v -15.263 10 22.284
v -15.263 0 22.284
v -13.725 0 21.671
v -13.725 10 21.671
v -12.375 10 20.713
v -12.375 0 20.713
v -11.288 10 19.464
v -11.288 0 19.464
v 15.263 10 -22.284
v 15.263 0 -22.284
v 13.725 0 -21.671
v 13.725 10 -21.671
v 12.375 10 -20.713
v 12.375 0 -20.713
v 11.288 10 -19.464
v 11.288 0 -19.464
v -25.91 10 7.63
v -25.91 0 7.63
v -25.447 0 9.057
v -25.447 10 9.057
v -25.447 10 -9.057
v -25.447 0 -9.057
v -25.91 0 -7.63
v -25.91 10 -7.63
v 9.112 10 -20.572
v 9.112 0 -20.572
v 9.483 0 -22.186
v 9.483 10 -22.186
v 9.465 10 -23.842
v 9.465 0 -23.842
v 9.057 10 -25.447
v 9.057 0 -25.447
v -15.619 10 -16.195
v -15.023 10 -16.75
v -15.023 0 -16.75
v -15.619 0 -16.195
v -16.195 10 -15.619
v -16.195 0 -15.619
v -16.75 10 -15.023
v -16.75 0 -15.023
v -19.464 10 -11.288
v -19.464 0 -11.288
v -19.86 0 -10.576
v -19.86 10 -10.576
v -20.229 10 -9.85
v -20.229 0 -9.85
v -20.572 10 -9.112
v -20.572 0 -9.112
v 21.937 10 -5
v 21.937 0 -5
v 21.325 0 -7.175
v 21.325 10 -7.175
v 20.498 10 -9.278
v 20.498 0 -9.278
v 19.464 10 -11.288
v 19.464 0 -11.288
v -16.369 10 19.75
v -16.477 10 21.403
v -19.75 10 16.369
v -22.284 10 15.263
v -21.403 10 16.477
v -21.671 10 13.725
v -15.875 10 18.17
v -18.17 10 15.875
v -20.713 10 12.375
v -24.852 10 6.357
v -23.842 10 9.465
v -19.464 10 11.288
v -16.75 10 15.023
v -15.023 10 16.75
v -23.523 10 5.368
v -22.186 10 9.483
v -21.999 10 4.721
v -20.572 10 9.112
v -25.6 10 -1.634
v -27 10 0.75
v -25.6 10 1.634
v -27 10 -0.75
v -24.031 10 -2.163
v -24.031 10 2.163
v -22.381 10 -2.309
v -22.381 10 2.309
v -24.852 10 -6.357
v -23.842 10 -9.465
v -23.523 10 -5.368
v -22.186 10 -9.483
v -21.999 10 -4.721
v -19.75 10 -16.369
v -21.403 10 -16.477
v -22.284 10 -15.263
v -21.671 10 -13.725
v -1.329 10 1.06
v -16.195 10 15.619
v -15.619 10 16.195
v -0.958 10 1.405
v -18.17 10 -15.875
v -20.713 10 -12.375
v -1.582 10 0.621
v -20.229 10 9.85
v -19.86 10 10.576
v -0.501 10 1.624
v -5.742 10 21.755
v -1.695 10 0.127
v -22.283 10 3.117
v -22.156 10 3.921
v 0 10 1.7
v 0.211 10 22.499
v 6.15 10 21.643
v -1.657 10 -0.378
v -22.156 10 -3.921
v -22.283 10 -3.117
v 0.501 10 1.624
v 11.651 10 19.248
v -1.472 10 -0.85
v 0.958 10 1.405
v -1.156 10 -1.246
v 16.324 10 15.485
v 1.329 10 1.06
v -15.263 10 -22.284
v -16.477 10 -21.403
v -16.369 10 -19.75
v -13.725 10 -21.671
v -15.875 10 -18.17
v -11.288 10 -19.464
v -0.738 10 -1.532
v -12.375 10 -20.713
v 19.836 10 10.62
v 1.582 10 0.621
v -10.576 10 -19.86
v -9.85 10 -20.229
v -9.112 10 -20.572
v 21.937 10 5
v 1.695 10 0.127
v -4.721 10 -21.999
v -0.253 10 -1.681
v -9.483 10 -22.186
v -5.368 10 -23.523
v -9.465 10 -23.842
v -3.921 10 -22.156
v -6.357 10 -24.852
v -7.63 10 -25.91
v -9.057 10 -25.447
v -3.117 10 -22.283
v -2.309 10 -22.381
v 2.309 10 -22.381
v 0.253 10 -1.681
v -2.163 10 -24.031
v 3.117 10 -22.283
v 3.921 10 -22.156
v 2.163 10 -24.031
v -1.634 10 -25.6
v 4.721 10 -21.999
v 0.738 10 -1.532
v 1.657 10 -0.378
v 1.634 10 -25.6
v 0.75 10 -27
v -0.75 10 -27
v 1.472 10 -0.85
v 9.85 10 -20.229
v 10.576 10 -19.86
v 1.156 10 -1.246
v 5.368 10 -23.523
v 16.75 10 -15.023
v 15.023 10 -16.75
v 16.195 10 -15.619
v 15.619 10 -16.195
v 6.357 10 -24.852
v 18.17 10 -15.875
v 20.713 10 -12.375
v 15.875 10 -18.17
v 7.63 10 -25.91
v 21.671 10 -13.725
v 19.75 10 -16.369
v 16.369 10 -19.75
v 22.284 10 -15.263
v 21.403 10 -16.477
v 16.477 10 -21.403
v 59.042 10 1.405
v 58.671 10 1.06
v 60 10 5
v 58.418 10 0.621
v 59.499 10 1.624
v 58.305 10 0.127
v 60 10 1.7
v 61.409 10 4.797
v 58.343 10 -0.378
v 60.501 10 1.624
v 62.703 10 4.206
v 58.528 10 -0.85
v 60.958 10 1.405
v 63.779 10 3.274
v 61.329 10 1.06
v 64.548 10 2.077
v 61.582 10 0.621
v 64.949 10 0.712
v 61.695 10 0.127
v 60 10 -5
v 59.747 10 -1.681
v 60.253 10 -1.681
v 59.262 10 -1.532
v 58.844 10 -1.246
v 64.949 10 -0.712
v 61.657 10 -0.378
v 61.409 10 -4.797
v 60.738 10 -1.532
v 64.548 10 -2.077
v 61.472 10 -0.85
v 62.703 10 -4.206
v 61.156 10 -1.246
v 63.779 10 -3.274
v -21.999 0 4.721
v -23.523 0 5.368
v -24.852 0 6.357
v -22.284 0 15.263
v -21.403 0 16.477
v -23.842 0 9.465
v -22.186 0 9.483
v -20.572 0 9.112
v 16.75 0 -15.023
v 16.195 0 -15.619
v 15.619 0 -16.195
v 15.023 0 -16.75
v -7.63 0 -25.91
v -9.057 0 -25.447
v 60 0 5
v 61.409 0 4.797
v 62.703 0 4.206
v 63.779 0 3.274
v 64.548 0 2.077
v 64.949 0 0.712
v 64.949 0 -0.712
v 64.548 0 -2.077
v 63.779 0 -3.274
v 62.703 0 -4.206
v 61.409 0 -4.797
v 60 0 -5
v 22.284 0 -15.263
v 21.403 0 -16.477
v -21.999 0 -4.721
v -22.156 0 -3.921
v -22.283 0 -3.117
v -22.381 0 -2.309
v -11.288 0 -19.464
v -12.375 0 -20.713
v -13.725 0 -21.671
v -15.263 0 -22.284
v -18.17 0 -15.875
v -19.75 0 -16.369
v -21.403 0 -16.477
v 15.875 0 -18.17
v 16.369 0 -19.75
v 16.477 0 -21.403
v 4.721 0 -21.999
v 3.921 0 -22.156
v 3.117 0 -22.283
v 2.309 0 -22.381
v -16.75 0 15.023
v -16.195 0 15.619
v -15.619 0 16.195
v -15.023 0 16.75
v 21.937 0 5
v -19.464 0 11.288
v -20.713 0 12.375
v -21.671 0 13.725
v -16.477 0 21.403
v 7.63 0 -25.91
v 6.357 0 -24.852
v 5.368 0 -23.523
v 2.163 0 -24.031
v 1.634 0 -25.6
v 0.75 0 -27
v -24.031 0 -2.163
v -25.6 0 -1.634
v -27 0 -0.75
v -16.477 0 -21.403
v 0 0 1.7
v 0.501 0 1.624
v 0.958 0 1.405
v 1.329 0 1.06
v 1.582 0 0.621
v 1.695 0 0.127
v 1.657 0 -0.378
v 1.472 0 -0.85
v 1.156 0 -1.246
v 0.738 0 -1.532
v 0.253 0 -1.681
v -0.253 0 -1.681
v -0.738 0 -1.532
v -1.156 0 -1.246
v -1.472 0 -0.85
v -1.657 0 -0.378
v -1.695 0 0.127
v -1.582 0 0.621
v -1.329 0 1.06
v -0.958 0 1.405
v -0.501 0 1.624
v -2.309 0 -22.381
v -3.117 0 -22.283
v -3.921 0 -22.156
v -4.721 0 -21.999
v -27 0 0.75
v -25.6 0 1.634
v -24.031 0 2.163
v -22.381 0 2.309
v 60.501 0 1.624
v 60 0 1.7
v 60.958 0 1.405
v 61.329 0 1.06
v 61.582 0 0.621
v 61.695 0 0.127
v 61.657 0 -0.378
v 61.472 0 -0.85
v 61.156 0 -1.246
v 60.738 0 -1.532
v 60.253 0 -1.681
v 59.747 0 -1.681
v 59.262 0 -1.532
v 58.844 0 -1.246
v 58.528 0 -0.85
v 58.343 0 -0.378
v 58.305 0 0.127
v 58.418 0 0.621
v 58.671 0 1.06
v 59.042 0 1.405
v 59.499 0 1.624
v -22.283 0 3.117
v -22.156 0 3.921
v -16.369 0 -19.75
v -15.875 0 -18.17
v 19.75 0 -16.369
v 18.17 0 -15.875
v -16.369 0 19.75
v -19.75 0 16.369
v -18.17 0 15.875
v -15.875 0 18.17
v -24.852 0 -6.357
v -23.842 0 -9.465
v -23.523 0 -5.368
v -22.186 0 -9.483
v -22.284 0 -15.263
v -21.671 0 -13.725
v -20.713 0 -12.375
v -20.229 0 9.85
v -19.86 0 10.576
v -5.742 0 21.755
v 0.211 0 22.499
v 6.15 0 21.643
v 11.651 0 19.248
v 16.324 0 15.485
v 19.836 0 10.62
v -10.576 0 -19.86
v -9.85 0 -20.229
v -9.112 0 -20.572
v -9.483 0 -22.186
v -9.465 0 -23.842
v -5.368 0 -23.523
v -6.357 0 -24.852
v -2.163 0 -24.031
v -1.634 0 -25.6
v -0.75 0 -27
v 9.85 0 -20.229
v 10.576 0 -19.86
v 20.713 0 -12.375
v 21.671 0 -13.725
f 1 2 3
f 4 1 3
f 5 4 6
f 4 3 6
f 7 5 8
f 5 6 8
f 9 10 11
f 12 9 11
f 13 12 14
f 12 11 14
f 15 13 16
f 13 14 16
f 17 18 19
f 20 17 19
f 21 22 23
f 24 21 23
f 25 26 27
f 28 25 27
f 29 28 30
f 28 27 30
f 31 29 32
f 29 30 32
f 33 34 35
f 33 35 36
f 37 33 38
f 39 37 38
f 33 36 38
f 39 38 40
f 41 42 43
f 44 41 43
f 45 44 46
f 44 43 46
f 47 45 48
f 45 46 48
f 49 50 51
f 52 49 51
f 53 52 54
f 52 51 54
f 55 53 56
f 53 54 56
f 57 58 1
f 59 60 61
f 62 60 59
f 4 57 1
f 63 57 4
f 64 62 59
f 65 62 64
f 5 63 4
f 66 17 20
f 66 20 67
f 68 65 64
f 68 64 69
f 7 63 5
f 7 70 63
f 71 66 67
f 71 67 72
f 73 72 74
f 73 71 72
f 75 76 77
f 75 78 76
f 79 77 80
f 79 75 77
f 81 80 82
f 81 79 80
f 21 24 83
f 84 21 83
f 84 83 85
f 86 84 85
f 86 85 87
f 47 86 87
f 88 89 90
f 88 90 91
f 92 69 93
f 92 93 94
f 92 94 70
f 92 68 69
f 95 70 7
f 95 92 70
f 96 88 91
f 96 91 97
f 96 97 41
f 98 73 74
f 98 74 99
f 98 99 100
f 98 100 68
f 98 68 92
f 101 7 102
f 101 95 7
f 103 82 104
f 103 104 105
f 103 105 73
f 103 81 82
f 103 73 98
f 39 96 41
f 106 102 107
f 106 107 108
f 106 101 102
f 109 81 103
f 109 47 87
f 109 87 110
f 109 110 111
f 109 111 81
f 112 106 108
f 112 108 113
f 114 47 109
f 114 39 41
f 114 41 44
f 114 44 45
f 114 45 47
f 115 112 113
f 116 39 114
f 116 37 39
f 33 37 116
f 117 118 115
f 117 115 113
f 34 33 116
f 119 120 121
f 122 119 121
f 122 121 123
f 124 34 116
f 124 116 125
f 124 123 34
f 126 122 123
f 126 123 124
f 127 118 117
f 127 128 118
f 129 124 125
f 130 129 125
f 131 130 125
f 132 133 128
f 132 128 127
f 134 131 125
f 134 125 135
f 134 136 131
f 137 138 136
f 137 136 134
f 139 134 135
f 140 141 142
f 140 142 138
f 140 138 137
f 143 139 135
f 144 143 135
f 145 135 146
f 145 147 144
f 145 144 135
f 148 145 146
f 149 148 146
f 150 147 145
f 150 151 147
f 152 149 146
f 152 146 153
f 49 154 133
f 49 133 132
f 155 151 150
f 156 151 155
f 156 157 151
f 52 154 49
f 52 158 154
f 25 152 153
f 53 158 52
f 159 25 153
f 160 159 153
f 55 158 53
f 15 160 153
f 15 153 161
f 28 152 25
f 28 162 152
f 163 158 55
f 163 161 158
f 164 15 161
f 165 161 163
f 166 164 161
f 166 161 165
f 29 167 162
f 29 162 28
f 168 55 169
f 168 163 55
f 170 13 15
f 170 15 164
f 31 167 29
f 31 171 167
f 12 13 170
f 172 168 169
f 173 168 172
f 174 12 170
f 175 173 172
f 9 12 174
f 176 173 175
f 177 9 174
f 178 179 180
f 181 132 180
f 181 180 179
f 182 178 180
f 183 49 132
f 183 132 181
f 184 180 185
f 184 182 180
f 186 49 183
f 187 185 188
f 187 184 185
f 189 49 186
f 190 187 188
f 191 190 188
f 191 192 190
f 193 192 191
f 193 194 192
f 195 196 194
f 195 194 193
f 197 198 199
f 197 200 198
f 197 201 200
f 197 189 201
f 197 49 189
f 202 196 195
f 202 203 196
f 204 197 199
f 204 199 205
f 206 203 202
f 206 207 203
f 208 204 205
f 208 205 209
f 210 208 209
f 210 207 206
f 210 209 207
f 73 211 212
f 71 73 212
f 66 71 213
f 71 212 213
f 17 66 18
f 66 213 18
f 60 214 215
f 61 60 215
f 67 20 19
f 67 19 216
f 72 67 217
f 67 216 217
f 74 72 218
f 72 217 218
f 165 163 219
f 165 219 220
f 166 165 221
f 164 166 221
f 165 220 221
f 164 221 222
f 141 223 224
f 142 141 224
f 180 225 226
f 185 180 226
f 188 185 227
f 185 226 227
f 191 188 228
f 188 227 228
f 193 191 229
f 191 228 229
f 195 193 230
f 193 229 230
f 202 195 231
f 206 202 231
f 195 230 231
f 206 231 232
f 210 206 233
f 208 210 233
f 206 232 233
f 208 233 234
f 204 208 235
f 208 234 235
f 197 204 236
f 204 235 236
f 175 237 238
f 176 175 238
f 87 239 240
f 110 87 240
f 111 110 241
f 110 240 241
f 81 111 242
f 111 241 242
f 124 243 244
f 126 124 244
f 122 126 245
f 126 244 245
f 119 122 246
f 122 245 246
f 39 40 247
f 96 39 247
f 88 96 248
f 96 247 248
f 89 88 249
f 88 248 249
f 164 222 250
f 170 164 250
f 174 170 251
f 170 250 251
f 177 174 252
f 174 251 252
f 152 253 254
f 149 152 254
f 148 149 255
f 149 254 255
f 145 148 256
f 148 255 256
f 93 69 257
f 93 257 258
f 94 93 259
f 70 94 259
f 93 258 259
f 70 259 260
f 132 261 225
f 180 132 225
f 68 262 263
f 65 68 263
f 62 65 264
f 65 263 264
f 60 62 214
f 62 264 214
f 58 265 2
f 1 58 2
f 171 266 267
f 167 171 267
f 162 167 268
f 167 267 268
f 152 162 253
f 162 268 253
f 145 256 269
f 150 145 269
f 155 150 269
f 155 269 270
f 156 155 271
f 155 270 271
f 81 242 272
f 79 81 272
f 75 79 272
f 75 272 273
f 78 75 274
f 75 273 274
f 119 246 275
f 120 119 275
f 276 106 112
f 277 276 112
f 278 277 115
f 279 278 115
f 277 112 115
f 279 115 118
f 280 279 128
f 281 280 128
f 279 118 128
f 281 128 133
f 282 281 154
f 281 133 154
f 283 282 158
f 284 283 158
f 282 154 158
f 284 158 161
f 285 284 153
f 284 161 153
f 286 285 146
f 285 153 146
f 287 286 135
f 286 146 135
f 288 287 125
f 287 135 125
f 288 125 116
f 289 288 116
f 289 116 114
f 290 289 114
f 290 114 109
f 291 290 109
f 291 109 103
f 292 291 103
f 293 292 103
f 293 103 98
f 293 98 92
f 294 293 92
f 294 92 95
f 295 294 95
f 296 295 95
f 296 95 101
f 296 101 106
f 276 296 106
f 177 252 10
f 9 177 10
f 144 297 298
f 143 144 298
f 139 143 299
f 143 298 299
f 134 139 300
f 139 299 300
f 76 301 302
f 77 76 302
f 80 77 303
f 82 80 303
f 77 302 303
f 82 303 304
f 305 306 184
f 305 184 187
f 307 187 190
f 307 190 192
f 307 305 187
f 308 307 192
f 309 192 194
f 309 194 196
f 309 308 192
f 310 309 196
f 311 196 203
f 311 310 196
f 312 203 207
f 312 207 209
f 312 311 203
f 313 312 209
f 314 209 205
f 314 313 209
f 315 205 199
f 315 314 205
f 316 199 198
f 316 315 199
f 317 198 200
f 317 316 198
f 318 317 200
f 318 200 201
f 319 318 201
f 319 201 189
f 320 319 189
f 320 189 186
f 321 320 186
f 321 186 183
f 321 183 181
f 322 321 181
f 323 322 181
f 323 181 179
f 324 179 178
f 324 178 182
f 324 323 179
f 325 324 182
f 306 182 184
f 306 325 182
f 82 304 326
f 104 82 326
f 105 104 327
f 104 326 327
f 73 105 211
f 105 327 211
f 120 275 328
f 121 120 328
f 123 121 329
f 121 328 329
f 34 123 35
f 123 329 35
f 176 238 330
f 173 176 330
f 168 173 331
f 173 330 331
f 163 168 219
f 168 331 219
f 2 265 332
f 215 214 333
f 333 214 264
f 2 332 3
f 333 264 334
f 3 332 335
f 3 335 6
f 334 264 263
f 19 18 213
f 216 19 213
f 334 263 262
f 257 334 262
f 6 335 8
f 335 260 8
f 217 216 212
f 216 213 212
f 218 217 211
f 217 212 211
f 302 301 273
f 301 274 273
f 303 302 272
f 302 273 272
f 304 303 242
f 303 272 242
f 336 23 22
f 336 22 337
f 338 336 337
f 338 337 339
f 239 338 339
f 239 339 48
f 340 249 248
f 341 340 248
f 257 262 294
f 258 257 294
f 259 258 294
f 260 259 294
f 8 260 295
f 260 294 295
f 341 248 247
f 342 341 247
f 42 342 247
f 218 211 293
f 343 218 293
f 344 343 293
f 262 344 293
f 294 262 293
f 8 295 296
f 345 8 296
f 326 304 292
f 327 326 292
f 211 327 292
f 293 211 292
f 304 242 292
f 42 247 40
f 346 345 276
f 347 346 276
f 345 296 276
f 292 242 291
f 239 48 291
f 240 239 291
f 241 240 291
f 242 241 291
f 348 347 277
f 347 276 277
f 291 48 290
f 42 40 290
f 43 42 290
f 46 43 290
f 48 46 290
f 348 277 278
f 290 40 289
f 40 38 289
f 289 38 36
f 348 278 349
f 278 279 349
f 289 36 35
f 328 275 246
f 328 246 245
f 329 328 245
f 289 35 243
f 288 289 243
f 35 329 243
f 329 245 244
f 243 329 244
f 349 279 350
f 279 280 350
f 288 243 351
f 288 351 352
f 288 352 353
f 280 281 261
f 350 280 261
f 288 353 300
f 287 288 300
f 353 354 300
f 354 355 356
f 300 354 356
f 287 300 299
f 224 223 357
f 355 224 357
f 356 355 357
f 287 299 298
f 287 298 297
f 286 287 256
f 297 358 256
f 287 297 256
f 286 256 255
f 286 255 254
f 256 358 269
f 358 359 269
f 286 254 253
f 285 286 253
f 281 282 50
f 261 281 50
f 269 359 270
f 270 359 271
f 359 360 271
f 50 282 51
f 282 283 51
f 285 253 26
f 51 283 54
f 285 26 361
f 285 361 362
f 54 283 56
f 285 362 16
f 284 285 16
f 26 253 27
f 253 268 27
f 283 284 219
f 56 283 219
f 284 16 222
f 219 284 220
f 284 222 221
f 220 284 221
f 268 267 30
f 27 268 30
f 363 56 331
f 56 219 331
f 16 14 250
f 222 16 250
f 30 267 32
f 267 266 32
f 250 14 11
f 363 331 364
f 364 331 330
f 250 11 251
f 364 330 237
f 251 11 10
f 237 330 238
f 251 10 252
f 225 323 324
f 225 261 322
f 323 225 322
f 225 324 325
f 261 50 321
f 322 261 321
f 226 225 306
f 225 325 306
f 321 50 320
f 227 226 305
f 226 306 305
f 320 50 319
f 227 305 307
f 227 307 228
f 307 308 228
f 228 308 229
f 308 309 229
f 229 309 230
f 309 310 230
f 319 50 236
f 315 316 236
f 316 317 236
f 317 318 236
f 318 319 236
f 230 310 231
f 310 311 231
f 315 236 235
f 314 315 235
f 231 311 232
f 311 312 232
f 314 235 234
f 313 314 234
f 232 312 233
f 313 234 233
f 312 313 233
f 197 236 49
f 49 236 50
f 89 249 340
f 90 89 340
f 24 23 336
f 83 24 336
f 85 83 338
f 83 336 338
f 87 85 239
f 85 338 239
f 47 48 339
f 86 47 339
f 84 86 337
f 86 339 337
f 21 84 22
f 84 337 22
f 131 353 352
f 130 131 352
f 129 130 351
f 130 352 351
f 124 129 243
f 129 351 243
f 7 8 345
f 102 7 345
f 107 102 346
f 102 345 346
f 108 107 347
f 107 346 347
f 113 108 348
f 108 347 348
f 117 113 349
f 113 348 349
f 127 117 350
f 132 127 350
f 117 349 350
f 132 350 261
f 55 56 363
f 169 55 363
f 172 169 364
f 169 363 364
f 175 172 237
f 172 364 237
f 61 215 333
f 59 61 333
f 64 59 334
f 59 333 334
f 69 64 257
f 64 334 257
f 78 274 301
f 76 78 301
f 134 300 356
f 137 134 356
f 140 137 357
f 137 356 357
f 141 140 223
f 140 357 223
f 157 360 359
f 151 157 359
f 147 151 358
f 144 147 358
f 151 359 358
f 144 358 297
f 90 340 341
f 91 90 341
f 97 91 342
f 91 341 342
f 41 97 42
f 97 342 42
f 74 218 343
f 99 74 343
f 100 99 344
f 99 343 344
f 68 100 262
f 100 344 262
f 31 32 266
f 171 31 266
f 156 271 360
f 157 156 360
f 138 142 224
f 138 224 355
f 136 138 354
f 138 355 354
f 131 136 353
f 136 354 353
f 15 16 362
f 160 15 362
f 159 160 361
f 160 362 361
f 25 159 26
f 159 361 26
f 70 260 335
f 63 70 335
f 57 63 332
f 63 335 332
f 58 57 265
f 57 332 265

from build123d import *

# Parameters (mm, degrees)
SKETCH2_R           = 1.7
BOSS_EXTRUDE1_DEPTH = 10
BOSS_EXTRUDE2_DEPTH = 10
SKETCH3_R           = 1.7
CUT_EXTRUDE1_DEPTH  = 72.091490349


with BuildPart() as part:
    # Sketch2 → Boss-Extrude1 (new body)
    with BuildSketch(Plane(origin=(0, 0, 0), x_dir=(1, 0, 0), z_dir=(0, 1, 0))):
        with BuildLine():
            ThreePointArc((60, -5), (65, 0), (60, 5))
            Line((60, 5), (21.937410968, 5))
            ThreePointArc((21.937410968, 5), (20.937955519, 8.237233678), (19.463757806, 11.287698262))
            ThreePointArc((19.463757806, 11.287698262), (21.232218388, 13.021454794), (22.284297787, 15.263439066))
            Line((22.284297787, 15.263439066), (21.402619909, 16.476964558))
            ThreePointArc((21.402619909, 16.476964558), (18.945255744, 16.16918883), (16.749870923, 15.023043103))
            ThreePointArc((16.749870923, 15.023043103), (15.909902577, 15.909902577), (15.023043103, 16.749870923))
            ThreePointArc((15.023043103, 16.749870923), (16.16918883, 18.945255744), (16.476964558, 21.402619909))
            Line((16.476964558, 21.402619909), (15.263439066, 22.284297787))
            ThreePointArc((15.263439066, 22.284297787), (13.021454794, 21.232218388), (11.287698262, 19.463757806))
            ThreePointArc((11.287698262, 19.463757806), (10.214786244, 20.047646794), (9.111768269, 20.572449514))
            ThreePointArc((9.111768269, 20.572449514), (9.523406413, 23.014563062), (9.056751235, 25.446763194))
            Line((9.056751235, 25.446763194), (7.630166461, 25.910288686))
            ThreePointArc((7.630166461, 25.910288686), (5.823023123, 24.216890476), (4.72060705, 21.999224284))
            ThreePointArc((4.72060705, 21.999224284), (3.519775463, 22.222987663), (2.308570071, 22.381253411))
            ThreePointArc((2.308570071, 22.381253411), (1.945406622, 24.831044595), (0.75, 27))
            Line((0.75, 27), (-0.75, 27))
            ThreePointArc((-0.75, 27), (-1.945406622, 24.831044595), (-2.308570071, 22.381253411))
            ThreePointArc((-2.308570071, 22.381253411), (-3.519775463, 22.222987663), (-4.72060705, 21.999224284))
            ThreePointArc((-4.72060705, 21.999224284), (-5.823023123, 24.216890476), (-7.630166461, 25.910288686))
            Line((-7.630166461, 25.910288686), (-9.056751235, 25.446763194))
            ThreePointArc((-9.056751235, 25.446763194), (-9.523406413, 23.014563062), (-9.111768269, 20.572449514))
            ThreePointArc((-9.111768269, 20.572449514), (-10.214786244, 20.047646794), (-11.287698262, 19.463757806))
            ThreePointArc((-11.287698262, 19.463757806), (-13.021454794, 21.232218388), (-15.263439066, 22.284297787))
            Line((-15.263439066, 22.284297787), (-16.476964558, 21.402619909))
            ThreePointArc((-16.476964558, 21.402619909), (-16.16918883, 18.945255744), (-15.023043103, 16.749870923))
            ThreePointArc((-15.023043103, 16.749870923), (-15.909902577, 15.909902577), (-16.749870923, 15.023043103))
            ThreePointArc((-16.749870923, 15.023043103), (-18.945255744, 16.16918883), (-21.402619909, 16.476964558))
            Line((-21.402619909, 16.476964558), (-22.284297787, 15.263439066))
            ThreePointArc((-22.284297787, 15.263439066), (-21.232218388, 13.021454794), (-19.463757806, 11.287698262))
            ThreePointArc((-19.463757806, 11.287698262), (-20.047646794, 10.214786244), (-20.572449514, 9.111768269))
            ThreePointArc((-20.572449514, 9.111768269), (-23.014563062, 9.523406413), (-25.446763194, 9.056751235))
            Line((-25.446763194, 9.056751235), (-25.910288686, 7.630166461))
            ThreePointArc((-25.910288686, 7.630166461), (-24.216890476, 5.823023123), (-21.999224284, 4.72060705))
            ThreePointArc((-21.999224284, 4.72060705), (-22.222987663, 3.519775463), (-22.381253411, 2.308570071))
            ThreePointArc((-22.381253411, 2.308570071), (-24.831044595, 1.945406622), (-27, 0.75))
            Line((-27, 0.75), (-27, -0.75))
            ThreePointArc((-27, -0.75), (-24.831044595, -1.945406622), (-22.381253411, -2.308570071))
            ThreePointArc((-22.381253411, -2.308570071), (-22.222987663, -3.519775463), (-21.999224284, -4.72060705))
            ThreePointArc((-21.999224284, -4.72060705), (-24.216890476, -5.823023123), (-25.910288686, -7.630166461))
            Line((-25.910288686, -7.630166461), (-25.446763194, -9.056751235))
            ThreePointArc((-25.446763194, -9.056751235), (-23.014563062, -9.523406413), (-20.572449514, -9.111768269))
            ThreePointArc((-20.572449514, -9.111768269), (-20.047646794, -10.214786244), (-19.463757806, -11.287698262))
            ThreePointArc((-19.463757806, -11.287698262), (-21.232218388, -13.021454794), (-22.284297787, -15.263439066))
            Line((-22.284297787, -15.263439066), (-21.402619909, -16.476964558))
            ThreePointArc((-21.402619909, -16.476964558), (-18.945255744, -16.16918883), (-16.749870923, -15.023043103))
            ThreePointArc((-16.749870923, -15.023043103), (-15.909902577, -15.909902577), (-15.023043103, -16.749870923))
            ThreePointArc((-15.023043103, -16.749870923), (-16.16918883, -18.945255744), (-16.476964558, -21.402619909))
            Line((-16.476964558, -21.402619909), (-15.263439066, -22.284297787))
            ThreePointArc((-15.263439066, -22.284297787), (-13.021454794, -21.232218388), (-11.287698262, -19.463757806))
            ThreePointArc((-11.287698262, -19.463757806), (9.111768269, -20.572449514), (21.999224284, -4.72060705))
            ThreePointArc((21.999224284, -4.72060705), (22.395016771, -4.848633199), (22.782483518, -5))
            Line((22.782483518, -5), (60, -5))
        make_face()
        with BuildLine():
            ThreePointArc((22.381253411, 2.308570071), (24.831044595, 1.945406622), (27, 0.75))
            Line((27, 0.75), (27, -0.75))
            ThreePointArc((27, -0.75), (24.831044595, -1.945406622), (22.381253411, -2.308570071))
            ThreePointArc((22.381253411, -2.308570071), (22.5, 0), (22.381253411, 2.308570071))
        make_face(mode=Mode.SUBTRACT)
        with Locations(Location((60, 0, 0), (0, 0, 270))):
            Circle(SKETCH2_R, mode=Mode.SUBTRACT)
    extrude(amount=BOSS_EXTRUDE1_DEPTH)

    # Sketch2<7> → Boss-Extrude2 (add)
    with BuildSketch(Plane(origin=(0, 0, 0), x_dir=(1, 0, 0), z_dir=(0, 1, 0))):
        with BuildLine():
            Line((21.937410968, -5), (22.782483518, -5))
            ThreePointArc((22.782483518, -5), (22.395016771, -4.848633199), (21.999224284, -4.72060705))
            ThreePointArc((21.999224284, -4.72060705), (21.968761786, -4.860401792), (21.937410968, -5))
        make_face()
        with BuildLine():
            ThreePointArc((27, 0.75), (24.831044595, 1.945406622), (22.381253411, 2.308570071))
            ThreePointArc((22.381253411, 2.308570071), (22.5, 0), (22.381253411, -2.308570071))
            ThreePointArc((22.381253411, -2.308570071), (24.831044595, -1.945406622), (27, -0.75))
            Line((27, -0.75), (27, 0.75))
        make_face()
    extrude(amount=BOSS_EXTRUDE2_DEPTH)

    # Sketch3 → Cut-Extrude1 (cut, through all)
    with BuildSketch(Plane(origin=(0, 10, 0), x_dir=(1, 0, 0), z_dir=(0, 1, 0))):
        with Locations(Location((0, 0, 0), (0, 0, 270))):
            Circle(SKETCH3_R)
    extrude(amount=-CUT_EXTRUDE1_DEPTH, mode=Mode.SUBTRACT)


solid = part.part
